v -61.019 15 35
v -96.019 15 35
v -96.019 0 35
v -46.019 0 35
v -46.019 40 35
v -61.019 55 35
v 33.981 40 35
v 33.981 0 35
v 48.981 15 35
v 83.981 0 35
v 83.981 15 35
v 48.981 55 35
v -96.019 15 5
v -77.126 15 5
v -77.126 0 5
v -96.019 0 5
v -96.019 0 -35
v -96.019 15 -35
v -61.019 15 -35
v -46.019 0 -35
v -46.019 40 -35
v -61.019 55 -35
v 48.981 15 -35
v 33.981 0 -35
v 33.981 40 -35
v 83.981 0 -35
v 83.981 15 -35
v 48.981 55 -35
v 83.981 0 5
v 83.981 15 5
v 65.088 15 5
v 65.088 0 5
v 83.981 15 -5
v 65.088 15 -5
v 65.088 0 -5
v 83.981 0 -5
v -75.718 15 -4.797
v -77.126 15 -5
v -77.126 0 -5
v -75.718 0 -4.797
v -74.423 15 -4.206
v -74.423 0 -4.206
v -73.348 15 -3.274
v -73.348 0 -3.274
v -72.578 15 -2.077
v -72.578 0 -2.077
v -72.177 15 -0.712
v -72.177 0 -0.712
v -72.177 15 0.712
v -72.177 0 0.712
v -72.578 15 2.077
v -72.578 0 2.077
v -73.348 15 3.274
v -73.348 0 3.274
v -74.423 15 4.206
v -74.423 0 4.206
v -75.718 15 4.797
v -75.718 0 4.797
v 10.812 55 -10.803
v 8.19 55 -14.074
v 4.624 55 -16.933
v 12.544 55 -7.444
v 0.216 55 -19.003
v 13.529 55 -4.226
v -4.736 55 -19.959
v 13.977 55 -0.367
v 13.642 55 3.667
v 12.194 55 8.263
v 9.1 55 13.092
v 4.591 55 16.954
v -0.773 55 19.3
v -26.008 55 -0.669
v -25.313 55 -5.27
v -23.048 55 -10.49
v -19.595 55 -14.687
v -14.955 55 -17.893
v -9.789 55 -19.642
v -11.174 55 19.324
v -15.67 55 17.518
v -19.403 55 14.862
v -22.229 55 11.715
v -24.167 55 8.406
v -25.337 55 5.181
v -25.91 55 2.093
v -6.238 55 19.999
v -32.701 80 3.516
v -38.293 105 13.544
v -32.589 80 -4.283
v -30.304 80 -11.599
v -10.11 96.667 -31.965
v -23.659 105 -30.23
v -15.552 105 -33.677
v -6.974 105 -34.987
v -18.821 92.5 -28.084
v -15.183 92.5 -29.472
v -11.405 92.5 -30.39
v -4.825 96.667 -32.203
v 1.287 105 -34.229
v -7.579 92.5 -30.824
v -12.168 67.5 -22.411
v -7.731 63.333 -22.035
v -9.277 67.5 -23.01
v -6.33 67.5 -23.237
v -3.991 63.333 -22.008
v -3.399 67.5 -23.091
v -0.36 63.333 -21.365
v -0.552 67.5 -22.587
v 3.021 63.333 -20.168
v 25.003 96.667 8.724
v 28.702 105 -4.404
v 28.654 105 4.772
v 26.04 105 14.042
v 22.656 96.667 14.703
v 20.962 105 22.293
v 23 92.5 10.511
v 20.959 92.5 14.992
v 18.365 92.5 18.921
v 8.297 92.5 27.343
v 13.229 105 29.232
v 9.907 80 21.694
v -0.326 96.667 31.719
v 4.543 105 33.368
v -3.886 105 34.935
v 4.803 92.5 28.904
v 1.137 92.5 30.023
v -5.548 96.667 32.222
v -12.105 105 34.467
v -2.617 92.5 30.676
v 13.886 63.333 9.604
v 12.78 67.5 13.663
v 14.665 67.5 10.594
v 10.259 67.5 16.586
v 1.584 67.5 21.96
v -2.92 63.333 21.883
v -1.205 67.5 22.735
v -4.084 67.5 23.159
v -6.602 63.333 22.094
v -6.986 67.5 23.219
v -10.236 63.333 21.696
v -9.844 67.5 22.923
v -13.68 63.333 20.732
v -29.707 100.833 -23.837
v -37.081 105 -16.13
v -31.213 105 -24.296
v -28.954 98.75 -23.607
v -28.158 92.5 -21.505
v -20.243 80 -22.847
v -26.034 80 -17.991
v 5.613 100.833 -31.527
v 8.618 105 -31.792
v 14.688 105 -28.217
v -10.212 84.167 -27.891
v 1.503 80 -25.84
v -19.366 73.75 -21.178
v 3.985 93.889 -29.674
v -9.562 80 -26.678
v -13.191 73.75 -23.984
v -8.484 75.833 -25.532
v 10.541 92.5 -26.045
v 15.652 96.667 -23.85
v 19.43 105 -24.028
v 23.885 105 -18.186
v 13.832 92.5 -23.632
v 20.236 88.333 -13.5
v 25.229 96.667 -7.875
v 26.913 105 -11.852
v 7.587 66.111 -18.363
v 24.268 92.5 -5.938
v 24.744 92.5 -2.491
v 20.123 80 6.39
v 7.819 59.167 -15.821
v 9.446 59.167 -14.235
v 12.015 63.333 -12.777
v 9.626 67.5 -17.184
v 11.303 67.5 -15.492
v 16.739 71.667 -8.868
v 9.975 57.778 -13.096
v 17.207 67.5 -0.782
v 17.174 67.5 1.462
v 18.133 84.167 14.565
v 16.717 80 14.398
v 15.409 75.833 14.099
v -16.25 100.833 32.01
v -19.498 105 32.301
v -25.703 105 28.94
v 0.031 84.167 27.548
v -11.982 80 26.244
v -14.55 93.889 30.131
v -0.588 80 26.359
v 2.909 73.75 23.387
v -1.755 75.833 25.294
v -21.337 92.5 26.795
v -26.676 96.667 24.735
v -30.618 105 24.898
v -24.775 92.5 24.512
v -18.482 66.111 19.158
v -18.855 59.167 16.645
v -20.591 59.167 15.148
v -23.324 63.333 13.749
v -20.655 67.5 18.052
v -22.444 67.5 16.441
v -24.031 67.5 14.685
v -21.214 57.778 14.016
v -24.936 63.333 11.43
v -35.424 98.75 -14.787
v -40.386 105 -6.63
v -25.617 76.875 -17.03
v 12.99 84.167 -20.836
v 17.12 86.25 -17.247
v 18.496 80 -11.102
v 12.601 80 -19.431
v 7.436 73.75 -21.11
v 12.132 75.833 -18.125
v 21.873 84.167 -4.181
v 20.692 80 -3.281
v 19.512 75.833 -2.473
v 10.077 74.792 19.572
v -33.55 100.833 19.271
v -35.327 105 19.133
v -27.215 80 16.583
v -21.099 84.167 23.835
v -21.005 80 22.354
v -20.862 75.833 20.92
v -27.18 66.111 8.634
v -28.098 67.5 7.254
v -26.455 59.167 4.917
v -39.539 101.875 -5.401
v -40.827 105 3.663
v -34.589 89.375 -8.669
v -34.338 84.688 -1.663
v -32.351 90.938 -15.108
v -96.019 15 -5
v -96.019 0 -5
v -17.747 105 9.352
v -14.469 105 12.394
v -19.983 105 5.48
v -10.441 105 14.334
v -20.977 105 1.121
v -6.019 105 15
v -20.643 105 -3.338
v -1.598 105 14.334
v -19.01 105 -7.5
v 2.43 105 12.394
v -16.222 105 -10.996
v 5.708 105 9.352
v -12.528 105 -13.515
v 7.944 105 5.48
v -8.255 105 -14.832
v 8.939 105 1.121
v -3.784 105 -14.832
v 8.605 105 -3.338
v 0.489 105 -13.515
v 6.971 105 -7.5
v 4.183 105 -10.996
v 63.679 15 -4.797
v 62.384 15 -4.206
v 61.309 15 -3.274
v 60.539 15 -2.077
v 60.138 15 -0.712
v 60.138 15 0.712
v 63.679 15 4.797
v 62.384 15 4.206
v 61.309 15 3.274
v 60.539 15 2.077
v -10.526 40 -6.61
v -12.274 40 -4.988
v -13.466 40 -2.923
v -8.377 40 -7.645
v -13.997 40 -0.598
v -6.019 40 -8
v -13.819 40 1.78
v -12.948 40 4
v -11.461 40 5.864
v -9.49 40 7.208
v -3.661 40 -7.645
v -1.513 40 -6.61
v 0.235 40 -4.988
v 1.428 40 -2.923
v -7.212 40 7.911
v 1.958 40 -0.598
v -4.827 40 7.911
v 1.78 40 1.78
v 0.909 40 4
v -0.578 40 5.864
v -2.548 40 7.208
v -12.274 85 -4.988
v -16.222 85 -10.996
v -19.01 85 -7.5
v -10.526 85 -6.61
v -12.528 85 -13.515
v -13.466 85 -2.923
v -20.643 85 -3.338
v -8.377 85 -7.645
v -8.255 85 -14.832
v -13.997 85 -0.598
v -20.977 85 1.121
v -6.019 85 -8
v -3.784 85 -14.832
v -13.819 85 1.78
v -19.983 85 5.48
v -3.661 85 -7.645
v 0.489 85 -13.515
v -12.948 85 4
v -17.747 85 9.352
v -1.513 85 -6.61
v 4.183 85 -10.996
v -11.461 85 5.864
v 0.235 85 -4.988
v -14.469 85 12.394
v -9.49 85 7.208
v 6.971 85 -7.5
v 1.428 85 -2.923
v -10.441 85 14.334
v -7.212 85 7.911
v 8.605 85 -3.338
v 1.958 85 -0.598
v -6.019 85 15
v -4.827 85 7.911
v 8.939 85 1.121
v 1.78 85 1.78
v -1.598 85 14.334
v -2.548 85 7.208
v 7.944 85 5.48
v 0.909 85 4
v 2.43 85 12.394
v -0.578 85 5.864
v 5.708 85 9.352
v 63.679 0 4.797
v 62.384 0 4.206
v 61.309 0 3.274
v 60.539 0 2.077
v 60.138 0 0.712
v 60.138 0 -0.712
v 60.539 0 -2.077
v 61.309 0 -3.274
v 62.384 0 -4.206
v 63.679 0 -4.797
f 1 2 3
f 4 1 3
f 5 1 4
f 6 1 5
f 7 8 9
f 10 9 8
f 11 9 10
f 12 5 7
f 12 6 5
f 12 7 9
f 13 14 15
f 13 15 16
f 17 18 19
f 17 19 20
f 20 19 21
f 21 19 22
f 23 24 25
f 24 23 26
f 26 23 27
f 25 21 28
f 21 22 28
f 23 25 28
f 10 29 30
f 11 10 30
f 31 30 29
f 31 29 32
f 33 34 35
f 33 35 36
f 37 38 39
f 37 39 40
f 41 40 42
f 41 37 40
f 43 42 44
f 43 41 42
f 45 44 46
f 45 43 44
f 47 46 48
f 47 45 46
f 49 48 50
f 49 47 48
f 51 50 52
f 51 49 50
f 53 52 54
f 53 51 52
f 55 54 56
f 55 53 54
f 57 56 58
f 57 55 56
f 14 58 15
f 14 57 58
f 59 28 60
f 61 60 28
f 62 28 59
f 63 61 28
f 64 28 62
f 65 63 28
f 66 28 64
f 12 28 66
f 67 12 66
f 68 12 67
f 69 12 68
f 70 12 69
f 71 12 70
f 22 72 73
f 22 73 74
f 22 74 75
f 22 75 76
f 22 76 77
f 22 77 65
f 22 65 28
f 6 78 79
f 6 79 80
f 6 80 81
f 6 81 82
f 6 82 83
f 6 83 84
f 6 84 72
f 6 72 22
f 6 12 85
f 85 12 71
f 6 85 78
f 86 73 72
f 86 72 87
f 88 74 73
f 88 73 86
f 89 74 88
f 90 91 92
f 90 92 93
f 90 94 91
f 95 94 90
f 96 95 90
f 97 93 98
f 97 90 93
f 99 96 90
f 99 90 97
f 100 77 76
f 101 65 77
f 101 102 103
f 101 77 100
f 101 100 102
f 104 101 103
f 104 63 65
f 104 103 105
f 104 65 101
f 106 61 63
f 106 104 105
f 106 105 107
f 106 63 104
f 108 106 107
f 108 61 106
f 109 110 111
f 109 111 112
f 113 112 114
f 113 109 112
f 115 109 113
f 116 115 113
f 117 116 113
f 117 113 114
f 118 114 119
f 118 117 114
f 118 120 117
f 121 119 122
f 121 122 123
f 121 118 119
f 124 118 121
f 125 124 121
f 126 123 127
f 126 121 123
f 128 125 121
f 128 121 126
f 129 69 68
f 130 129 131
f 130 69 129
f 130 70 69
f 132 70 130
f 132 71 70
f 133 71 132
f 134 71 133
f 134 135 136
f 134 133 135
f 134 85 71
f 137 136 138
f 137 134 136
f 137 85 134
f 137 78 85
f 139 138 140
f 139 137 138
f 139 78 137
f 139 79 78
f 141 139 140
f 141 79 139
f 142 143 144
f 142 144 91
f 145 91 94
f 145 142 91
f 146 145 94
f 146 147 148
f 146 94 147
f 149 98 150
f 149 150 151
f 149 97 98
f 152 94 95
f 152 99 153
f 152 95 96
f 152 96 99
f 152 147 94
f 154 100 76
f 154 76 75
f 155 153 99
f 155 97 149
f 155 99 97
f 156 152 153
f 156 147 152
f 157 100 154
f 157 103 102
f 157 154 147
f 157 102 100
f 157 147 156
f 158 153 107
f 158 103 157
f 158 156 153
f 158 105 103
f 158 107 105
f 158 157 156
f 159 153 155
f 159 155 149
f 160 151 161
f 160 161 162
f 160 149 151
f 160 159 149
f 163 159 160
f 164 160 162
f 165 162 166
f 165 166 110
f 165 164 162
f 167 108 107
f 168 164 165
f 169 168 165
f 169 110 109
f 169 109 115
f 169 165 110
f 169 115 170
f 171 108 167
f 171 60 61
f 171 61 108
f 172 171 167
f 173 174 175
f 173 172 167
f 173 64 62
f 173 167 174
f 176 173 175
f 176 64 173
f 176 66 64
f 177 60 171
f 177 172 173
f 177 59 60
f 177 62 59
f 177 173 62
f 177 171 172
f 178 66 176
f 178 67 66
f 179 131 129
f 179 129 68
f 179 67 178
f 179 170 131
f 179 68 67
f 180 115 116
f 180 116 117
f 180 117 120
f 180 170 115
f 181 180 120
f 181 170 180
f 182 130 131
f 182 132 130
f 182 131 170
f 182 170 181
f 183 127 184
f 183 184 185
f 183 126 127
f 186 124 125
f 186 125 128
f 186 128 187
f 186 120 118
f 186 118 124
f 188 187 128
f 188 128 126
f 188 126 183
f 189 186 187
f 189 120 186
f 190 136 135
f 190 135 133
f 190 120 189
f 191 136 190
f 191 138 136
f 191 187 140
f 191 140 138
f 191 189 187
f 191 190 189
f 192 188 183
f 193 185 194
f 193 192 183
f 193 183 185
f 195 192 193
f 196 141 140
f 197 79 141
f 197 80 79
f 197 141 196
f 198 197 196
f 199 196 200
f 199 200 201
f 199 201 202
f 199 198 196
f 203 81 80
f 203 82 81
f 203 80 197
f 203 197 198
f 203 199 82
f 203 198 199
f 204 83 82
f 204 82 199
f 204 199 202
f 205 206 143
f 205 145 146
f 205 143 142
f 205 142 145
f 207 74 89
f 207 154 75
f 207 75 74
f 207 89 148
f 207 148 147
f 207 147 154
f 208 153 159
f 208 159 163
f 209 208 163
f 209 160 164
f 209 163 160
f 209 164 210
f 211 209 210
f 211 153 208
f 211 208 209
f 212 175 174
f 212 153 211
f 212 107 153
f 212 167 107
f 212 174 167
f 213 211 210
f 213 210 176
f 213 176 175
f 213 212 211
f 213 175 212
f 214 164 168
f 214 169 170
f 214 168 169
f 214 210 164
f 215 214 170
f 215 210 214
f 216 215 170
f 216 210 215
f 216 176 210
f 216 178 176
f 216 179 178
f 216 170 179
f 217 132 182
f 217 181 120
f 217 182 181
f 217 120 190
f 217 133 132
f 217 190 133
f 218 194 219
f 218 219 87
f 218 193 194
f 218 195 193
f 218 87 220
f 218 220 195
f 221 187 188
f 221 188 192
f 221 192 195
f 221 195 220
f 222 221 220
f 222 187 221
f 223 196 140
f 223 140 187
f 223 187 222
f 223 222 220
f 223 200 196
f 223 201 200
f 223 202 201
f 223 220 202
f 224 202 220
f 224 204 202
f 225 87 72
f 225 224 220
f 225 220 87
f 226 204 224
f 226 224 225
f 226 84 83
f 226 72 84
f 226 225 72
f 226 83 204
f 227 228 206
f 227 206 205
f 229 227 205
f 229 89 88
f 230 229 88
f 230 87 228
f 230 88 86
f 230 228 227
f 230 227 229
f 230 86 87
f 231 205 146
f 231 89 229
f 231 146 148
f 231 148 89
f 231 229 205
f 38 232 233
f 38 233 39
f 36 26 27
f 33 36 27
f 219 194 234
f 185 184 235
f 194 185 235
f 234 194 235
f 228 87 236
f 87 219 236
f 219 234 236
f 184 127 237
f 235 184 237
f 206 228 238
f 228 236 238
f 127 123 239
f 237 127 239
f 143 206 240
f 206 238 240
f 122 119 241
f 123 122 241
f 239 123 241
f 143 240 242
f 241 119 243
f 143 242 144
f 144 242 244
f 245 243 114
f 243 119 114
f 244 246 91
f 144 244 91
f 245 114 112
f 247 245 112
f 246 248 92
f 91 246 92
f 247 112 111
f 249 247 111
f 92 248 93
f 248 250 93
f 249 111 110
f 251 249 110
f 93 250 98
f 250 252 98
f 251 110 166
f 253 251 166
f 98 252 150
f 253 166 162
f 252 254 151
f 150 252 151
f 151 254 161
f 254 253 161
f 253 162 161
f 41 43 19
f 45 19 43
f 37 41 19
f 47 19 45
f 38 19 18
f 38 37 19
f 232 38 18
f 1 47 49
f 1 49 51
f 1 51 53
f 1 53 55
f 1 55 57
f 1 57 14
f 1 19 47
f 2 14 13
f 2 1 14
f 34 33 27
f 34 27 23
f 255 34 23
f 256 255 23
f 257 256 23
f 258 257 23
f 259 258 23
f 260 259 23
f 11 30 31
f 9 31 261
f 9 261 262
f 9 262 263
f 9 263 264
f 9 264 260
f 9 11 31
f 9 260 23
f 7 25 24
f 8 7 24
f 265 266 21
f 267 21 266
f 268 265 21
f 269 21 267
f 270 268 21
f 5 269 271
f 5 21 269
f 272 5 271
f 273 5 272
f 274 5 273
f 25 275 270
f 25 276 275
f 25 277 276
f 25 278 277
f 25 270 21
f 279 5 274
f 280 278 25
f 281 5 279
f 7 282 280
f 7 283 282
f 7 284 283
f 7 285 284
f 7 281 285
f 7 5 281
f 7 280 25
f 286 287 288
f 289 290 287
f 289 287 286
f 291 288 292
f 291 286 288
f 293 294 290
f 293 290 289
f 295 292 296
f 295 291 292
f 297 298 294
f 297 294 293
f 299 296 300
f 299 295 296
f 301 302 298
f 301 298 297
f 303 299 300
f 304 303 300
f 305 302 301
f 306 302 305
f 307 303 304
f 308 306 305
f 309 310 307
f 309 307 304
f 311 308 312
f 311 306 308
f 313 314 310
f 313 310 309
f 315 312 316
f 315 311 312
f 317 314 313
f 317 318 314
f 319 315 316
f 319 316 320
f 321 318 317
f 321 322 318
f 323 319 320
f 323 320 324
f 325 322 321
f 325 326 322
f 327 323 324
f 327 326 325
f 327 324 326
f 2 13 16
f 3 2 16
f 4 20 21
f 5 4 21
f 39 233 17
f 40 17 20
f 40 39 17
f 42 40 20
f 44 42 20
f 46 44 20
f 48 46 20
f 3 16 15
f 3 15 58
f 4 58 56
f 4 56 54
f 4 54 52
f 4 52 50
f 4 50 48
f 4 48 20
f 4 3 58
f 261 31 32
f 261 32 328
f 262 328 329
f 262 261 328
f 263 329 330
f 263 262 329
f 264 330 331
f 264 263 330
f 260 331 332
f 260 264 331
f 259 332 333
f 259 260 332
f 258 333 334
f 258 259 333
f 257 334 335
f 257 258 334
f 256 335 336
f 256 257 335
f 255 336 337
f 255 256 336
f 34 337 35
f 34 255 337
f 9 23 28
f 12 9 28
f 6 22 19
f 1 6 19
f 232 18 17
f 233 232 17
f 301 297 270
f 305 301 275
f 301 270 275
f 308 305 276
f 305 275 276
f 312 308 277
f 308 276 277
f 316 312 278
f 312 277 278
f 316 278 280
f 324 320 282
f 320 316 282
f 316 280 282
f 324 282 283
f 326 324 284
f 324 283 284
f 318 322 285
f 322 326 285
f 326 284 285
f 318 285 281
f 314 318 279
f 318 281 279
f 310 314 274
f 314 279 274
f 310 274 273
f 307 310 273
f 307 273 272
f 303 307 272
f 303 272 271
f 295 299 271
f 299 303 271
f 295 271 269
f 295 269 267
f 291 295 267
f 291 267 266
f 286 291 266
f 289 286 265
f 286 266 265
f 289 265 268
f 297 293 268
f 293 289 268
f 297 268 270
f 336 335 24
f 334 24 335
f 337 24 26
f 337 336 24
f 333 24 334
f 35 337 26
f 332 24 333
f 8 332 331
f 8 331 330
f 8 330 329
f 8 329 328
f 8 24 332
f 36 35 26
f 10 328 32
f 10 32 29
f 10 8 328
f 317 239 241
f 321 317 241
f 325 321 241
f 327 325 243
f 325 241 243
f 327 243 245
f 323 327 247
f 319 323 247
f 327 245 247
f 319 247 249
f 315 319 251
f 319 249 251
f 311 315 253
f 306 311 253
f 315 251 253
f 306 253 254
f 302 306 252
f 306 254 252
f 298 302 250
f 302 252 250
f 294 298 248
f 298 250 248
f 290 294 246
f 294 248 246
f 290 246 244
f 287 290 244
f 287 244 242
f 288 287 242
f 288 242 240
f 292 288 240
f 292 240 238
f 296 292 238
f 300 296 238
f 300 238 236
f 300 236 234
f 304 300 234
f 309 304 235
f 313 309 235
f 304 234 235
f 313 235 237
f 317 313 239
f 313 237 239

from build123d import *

# Parameters (mm, degrees)
BOSS_EXTRUDE1_DEPTH = 35
CUT_EXTRUDE1_DEPTH  = 70
SKETCH11_R          = 15
CUT_EXTRUDE2_DEPTH  = 20
SKETCH12_R          = 8
CUT_EXTRUDE3_DEPTH  = 30
CUT_EXTRUDE4_START  = -30
SKETCH13_R          = 8
CUT_EXTRUDE4_DEPTH  = 30


with BuildPart() as part:
    # Sketch1 → Boss-Extrude1 (new, symmetric)
    with BuildSketch(Plane.XY):
        Polygon((-46.019417476, 0), (-46.019417476, 40), (33.980582524, 40), (33.980582524, 0), (83.980582524, 0), (83.980582524, 15), (48.980582524, 15), (48.980582524, 55), (-61.019417476, 55), (-61.019417476, 15), (-96.019417476, 15), (-96.019417476, 0), align=None)
    extrude(amount=BOSS_EXTRUDE1_DEPTH, both=True)

    # Sketch2 → Cut-Extrude1 (cut)
    with BuildSketch(Plane(origin=(0, 15, 0), x_dir=(1, 0, 0), z_dir=(0, 1, 0))):
        with BuildLine():
            Line((65.087517656, 5), (83.980582524, 5))
            Line((83.980582524, 5), (83.980582524, -5))
            Line((83.980582524, -5), (65.087517656, -5))
            ThreePointArc((65.087517656, -5), (60.087517656, 0), (65.087517656, 5))
        make_face()
        with BuildLine():
            Line((-96.019417476, -5), (-96.019417476, 5))
            Line((-96.019417476, 5), (-77.126352608, 5))
            ThreePointArc((-77.126352608, 5), (-72.126352608, 0), (-77.126352608, -5))
            Line((-77.126352608, -5), (-96.019417476, -5))
        make_face()
    extrude(amount=-CUT_EXTRUDE1_DEPTH, mode=Mode.SUBTRACT)

    # Loft1: read off the stored shape, not the designer's step
    # Loft1: loft between two sections, ruled curve by curve
    loft1_from = [
        Edge.make_bspline([(-38.292502188, 105, 13.54429781), (-65.381097807, 105, -51.001871615), (-0.834928382, 105, -78.090467234), (26.253667237, 105, -13.54429781), (53.342262856, 105, 51.001871615), (-11.203906569, 105, 78.090467234), (-38.292502188, 105, 13.54429781)], [0, 0, 0, 0, 0.5, 0.5, 0.5, 1, 1, 1, 1], 3, [1, 0.333333333, 0.333333333, 1, 0.333333333, 0.333333333, 1]),
    ]
    loft1_to = [
        Edge.make_bspline([(-26.008227644, 55, -0.668930523), (-24.670366599, 55, -40.64655086), (15.307253739, 55, -39.308689814), (13.969392693, 55, 0.668930523), (12.631531647, 55, 40.64655086), (-27.34608869, 55, 39.308689814), (-26.008227644, 55, -0.668930523)], [0, 0, 0, 0, 0.5, 0.5, 0.5, 1, 1, 1, 1], 3, [1, 0.333333333, 0.333333333, 1, 0.333333333, 0.333333333, 1]),
    ]
    loft1 = Solid(Shell([*[Face.make_surface_from_curves(loft1_from[k], loft1_to[k]) for k in range(1)], Face(Wire(loft1_from)), Face(Wire(loft1_to))]))
    add(loft1)

    # Sketch11 → Cut-Extrude2 (cut)
    with BuildSketch(Plane(origin=(0, 105, 0), x_dir=(1, 0, 0), z_dir=(0, 1, 0))):
        with Locations(Location((-6.019417476, 0, 0), (0, 0, 270))):
            Circle(SKETCH11_R)
    extrude(amount=-CUT_EXTRUDE2_DEPTH, mode=Mode.SUBTRACT)

    # Sketch12 → Cut-Extrude3 (cut)
    with BuildSketch(Plane.XZ.offset(-40)):
        with Locations(Location((-6.019417476, 0, 0), (0, 0, 270))):
            Circle(SKETCH12_R)
    extrude(amount=-CUT_EXTRUDE3_DEPTH, mode=Mode.SUBTRACT)

    # Sketch13 → Cut-Extrude4 (cut)
    with BuildSketch(Plane(origin=(0, 85, 0), x_dir=(1, 0, 0), z_dir=(0, 1, 0)).offset(CUT_EXTRUDE4_START)):
        with Locations(Location((-6.019417476, 0, 0), (0, 0, 90))):
            Circle(SKETCH13_R)
    extrude(amount=CUT_EXTRUDE4_DEPTH, mode=Mode.SUBTRACT)


solid = part.part
